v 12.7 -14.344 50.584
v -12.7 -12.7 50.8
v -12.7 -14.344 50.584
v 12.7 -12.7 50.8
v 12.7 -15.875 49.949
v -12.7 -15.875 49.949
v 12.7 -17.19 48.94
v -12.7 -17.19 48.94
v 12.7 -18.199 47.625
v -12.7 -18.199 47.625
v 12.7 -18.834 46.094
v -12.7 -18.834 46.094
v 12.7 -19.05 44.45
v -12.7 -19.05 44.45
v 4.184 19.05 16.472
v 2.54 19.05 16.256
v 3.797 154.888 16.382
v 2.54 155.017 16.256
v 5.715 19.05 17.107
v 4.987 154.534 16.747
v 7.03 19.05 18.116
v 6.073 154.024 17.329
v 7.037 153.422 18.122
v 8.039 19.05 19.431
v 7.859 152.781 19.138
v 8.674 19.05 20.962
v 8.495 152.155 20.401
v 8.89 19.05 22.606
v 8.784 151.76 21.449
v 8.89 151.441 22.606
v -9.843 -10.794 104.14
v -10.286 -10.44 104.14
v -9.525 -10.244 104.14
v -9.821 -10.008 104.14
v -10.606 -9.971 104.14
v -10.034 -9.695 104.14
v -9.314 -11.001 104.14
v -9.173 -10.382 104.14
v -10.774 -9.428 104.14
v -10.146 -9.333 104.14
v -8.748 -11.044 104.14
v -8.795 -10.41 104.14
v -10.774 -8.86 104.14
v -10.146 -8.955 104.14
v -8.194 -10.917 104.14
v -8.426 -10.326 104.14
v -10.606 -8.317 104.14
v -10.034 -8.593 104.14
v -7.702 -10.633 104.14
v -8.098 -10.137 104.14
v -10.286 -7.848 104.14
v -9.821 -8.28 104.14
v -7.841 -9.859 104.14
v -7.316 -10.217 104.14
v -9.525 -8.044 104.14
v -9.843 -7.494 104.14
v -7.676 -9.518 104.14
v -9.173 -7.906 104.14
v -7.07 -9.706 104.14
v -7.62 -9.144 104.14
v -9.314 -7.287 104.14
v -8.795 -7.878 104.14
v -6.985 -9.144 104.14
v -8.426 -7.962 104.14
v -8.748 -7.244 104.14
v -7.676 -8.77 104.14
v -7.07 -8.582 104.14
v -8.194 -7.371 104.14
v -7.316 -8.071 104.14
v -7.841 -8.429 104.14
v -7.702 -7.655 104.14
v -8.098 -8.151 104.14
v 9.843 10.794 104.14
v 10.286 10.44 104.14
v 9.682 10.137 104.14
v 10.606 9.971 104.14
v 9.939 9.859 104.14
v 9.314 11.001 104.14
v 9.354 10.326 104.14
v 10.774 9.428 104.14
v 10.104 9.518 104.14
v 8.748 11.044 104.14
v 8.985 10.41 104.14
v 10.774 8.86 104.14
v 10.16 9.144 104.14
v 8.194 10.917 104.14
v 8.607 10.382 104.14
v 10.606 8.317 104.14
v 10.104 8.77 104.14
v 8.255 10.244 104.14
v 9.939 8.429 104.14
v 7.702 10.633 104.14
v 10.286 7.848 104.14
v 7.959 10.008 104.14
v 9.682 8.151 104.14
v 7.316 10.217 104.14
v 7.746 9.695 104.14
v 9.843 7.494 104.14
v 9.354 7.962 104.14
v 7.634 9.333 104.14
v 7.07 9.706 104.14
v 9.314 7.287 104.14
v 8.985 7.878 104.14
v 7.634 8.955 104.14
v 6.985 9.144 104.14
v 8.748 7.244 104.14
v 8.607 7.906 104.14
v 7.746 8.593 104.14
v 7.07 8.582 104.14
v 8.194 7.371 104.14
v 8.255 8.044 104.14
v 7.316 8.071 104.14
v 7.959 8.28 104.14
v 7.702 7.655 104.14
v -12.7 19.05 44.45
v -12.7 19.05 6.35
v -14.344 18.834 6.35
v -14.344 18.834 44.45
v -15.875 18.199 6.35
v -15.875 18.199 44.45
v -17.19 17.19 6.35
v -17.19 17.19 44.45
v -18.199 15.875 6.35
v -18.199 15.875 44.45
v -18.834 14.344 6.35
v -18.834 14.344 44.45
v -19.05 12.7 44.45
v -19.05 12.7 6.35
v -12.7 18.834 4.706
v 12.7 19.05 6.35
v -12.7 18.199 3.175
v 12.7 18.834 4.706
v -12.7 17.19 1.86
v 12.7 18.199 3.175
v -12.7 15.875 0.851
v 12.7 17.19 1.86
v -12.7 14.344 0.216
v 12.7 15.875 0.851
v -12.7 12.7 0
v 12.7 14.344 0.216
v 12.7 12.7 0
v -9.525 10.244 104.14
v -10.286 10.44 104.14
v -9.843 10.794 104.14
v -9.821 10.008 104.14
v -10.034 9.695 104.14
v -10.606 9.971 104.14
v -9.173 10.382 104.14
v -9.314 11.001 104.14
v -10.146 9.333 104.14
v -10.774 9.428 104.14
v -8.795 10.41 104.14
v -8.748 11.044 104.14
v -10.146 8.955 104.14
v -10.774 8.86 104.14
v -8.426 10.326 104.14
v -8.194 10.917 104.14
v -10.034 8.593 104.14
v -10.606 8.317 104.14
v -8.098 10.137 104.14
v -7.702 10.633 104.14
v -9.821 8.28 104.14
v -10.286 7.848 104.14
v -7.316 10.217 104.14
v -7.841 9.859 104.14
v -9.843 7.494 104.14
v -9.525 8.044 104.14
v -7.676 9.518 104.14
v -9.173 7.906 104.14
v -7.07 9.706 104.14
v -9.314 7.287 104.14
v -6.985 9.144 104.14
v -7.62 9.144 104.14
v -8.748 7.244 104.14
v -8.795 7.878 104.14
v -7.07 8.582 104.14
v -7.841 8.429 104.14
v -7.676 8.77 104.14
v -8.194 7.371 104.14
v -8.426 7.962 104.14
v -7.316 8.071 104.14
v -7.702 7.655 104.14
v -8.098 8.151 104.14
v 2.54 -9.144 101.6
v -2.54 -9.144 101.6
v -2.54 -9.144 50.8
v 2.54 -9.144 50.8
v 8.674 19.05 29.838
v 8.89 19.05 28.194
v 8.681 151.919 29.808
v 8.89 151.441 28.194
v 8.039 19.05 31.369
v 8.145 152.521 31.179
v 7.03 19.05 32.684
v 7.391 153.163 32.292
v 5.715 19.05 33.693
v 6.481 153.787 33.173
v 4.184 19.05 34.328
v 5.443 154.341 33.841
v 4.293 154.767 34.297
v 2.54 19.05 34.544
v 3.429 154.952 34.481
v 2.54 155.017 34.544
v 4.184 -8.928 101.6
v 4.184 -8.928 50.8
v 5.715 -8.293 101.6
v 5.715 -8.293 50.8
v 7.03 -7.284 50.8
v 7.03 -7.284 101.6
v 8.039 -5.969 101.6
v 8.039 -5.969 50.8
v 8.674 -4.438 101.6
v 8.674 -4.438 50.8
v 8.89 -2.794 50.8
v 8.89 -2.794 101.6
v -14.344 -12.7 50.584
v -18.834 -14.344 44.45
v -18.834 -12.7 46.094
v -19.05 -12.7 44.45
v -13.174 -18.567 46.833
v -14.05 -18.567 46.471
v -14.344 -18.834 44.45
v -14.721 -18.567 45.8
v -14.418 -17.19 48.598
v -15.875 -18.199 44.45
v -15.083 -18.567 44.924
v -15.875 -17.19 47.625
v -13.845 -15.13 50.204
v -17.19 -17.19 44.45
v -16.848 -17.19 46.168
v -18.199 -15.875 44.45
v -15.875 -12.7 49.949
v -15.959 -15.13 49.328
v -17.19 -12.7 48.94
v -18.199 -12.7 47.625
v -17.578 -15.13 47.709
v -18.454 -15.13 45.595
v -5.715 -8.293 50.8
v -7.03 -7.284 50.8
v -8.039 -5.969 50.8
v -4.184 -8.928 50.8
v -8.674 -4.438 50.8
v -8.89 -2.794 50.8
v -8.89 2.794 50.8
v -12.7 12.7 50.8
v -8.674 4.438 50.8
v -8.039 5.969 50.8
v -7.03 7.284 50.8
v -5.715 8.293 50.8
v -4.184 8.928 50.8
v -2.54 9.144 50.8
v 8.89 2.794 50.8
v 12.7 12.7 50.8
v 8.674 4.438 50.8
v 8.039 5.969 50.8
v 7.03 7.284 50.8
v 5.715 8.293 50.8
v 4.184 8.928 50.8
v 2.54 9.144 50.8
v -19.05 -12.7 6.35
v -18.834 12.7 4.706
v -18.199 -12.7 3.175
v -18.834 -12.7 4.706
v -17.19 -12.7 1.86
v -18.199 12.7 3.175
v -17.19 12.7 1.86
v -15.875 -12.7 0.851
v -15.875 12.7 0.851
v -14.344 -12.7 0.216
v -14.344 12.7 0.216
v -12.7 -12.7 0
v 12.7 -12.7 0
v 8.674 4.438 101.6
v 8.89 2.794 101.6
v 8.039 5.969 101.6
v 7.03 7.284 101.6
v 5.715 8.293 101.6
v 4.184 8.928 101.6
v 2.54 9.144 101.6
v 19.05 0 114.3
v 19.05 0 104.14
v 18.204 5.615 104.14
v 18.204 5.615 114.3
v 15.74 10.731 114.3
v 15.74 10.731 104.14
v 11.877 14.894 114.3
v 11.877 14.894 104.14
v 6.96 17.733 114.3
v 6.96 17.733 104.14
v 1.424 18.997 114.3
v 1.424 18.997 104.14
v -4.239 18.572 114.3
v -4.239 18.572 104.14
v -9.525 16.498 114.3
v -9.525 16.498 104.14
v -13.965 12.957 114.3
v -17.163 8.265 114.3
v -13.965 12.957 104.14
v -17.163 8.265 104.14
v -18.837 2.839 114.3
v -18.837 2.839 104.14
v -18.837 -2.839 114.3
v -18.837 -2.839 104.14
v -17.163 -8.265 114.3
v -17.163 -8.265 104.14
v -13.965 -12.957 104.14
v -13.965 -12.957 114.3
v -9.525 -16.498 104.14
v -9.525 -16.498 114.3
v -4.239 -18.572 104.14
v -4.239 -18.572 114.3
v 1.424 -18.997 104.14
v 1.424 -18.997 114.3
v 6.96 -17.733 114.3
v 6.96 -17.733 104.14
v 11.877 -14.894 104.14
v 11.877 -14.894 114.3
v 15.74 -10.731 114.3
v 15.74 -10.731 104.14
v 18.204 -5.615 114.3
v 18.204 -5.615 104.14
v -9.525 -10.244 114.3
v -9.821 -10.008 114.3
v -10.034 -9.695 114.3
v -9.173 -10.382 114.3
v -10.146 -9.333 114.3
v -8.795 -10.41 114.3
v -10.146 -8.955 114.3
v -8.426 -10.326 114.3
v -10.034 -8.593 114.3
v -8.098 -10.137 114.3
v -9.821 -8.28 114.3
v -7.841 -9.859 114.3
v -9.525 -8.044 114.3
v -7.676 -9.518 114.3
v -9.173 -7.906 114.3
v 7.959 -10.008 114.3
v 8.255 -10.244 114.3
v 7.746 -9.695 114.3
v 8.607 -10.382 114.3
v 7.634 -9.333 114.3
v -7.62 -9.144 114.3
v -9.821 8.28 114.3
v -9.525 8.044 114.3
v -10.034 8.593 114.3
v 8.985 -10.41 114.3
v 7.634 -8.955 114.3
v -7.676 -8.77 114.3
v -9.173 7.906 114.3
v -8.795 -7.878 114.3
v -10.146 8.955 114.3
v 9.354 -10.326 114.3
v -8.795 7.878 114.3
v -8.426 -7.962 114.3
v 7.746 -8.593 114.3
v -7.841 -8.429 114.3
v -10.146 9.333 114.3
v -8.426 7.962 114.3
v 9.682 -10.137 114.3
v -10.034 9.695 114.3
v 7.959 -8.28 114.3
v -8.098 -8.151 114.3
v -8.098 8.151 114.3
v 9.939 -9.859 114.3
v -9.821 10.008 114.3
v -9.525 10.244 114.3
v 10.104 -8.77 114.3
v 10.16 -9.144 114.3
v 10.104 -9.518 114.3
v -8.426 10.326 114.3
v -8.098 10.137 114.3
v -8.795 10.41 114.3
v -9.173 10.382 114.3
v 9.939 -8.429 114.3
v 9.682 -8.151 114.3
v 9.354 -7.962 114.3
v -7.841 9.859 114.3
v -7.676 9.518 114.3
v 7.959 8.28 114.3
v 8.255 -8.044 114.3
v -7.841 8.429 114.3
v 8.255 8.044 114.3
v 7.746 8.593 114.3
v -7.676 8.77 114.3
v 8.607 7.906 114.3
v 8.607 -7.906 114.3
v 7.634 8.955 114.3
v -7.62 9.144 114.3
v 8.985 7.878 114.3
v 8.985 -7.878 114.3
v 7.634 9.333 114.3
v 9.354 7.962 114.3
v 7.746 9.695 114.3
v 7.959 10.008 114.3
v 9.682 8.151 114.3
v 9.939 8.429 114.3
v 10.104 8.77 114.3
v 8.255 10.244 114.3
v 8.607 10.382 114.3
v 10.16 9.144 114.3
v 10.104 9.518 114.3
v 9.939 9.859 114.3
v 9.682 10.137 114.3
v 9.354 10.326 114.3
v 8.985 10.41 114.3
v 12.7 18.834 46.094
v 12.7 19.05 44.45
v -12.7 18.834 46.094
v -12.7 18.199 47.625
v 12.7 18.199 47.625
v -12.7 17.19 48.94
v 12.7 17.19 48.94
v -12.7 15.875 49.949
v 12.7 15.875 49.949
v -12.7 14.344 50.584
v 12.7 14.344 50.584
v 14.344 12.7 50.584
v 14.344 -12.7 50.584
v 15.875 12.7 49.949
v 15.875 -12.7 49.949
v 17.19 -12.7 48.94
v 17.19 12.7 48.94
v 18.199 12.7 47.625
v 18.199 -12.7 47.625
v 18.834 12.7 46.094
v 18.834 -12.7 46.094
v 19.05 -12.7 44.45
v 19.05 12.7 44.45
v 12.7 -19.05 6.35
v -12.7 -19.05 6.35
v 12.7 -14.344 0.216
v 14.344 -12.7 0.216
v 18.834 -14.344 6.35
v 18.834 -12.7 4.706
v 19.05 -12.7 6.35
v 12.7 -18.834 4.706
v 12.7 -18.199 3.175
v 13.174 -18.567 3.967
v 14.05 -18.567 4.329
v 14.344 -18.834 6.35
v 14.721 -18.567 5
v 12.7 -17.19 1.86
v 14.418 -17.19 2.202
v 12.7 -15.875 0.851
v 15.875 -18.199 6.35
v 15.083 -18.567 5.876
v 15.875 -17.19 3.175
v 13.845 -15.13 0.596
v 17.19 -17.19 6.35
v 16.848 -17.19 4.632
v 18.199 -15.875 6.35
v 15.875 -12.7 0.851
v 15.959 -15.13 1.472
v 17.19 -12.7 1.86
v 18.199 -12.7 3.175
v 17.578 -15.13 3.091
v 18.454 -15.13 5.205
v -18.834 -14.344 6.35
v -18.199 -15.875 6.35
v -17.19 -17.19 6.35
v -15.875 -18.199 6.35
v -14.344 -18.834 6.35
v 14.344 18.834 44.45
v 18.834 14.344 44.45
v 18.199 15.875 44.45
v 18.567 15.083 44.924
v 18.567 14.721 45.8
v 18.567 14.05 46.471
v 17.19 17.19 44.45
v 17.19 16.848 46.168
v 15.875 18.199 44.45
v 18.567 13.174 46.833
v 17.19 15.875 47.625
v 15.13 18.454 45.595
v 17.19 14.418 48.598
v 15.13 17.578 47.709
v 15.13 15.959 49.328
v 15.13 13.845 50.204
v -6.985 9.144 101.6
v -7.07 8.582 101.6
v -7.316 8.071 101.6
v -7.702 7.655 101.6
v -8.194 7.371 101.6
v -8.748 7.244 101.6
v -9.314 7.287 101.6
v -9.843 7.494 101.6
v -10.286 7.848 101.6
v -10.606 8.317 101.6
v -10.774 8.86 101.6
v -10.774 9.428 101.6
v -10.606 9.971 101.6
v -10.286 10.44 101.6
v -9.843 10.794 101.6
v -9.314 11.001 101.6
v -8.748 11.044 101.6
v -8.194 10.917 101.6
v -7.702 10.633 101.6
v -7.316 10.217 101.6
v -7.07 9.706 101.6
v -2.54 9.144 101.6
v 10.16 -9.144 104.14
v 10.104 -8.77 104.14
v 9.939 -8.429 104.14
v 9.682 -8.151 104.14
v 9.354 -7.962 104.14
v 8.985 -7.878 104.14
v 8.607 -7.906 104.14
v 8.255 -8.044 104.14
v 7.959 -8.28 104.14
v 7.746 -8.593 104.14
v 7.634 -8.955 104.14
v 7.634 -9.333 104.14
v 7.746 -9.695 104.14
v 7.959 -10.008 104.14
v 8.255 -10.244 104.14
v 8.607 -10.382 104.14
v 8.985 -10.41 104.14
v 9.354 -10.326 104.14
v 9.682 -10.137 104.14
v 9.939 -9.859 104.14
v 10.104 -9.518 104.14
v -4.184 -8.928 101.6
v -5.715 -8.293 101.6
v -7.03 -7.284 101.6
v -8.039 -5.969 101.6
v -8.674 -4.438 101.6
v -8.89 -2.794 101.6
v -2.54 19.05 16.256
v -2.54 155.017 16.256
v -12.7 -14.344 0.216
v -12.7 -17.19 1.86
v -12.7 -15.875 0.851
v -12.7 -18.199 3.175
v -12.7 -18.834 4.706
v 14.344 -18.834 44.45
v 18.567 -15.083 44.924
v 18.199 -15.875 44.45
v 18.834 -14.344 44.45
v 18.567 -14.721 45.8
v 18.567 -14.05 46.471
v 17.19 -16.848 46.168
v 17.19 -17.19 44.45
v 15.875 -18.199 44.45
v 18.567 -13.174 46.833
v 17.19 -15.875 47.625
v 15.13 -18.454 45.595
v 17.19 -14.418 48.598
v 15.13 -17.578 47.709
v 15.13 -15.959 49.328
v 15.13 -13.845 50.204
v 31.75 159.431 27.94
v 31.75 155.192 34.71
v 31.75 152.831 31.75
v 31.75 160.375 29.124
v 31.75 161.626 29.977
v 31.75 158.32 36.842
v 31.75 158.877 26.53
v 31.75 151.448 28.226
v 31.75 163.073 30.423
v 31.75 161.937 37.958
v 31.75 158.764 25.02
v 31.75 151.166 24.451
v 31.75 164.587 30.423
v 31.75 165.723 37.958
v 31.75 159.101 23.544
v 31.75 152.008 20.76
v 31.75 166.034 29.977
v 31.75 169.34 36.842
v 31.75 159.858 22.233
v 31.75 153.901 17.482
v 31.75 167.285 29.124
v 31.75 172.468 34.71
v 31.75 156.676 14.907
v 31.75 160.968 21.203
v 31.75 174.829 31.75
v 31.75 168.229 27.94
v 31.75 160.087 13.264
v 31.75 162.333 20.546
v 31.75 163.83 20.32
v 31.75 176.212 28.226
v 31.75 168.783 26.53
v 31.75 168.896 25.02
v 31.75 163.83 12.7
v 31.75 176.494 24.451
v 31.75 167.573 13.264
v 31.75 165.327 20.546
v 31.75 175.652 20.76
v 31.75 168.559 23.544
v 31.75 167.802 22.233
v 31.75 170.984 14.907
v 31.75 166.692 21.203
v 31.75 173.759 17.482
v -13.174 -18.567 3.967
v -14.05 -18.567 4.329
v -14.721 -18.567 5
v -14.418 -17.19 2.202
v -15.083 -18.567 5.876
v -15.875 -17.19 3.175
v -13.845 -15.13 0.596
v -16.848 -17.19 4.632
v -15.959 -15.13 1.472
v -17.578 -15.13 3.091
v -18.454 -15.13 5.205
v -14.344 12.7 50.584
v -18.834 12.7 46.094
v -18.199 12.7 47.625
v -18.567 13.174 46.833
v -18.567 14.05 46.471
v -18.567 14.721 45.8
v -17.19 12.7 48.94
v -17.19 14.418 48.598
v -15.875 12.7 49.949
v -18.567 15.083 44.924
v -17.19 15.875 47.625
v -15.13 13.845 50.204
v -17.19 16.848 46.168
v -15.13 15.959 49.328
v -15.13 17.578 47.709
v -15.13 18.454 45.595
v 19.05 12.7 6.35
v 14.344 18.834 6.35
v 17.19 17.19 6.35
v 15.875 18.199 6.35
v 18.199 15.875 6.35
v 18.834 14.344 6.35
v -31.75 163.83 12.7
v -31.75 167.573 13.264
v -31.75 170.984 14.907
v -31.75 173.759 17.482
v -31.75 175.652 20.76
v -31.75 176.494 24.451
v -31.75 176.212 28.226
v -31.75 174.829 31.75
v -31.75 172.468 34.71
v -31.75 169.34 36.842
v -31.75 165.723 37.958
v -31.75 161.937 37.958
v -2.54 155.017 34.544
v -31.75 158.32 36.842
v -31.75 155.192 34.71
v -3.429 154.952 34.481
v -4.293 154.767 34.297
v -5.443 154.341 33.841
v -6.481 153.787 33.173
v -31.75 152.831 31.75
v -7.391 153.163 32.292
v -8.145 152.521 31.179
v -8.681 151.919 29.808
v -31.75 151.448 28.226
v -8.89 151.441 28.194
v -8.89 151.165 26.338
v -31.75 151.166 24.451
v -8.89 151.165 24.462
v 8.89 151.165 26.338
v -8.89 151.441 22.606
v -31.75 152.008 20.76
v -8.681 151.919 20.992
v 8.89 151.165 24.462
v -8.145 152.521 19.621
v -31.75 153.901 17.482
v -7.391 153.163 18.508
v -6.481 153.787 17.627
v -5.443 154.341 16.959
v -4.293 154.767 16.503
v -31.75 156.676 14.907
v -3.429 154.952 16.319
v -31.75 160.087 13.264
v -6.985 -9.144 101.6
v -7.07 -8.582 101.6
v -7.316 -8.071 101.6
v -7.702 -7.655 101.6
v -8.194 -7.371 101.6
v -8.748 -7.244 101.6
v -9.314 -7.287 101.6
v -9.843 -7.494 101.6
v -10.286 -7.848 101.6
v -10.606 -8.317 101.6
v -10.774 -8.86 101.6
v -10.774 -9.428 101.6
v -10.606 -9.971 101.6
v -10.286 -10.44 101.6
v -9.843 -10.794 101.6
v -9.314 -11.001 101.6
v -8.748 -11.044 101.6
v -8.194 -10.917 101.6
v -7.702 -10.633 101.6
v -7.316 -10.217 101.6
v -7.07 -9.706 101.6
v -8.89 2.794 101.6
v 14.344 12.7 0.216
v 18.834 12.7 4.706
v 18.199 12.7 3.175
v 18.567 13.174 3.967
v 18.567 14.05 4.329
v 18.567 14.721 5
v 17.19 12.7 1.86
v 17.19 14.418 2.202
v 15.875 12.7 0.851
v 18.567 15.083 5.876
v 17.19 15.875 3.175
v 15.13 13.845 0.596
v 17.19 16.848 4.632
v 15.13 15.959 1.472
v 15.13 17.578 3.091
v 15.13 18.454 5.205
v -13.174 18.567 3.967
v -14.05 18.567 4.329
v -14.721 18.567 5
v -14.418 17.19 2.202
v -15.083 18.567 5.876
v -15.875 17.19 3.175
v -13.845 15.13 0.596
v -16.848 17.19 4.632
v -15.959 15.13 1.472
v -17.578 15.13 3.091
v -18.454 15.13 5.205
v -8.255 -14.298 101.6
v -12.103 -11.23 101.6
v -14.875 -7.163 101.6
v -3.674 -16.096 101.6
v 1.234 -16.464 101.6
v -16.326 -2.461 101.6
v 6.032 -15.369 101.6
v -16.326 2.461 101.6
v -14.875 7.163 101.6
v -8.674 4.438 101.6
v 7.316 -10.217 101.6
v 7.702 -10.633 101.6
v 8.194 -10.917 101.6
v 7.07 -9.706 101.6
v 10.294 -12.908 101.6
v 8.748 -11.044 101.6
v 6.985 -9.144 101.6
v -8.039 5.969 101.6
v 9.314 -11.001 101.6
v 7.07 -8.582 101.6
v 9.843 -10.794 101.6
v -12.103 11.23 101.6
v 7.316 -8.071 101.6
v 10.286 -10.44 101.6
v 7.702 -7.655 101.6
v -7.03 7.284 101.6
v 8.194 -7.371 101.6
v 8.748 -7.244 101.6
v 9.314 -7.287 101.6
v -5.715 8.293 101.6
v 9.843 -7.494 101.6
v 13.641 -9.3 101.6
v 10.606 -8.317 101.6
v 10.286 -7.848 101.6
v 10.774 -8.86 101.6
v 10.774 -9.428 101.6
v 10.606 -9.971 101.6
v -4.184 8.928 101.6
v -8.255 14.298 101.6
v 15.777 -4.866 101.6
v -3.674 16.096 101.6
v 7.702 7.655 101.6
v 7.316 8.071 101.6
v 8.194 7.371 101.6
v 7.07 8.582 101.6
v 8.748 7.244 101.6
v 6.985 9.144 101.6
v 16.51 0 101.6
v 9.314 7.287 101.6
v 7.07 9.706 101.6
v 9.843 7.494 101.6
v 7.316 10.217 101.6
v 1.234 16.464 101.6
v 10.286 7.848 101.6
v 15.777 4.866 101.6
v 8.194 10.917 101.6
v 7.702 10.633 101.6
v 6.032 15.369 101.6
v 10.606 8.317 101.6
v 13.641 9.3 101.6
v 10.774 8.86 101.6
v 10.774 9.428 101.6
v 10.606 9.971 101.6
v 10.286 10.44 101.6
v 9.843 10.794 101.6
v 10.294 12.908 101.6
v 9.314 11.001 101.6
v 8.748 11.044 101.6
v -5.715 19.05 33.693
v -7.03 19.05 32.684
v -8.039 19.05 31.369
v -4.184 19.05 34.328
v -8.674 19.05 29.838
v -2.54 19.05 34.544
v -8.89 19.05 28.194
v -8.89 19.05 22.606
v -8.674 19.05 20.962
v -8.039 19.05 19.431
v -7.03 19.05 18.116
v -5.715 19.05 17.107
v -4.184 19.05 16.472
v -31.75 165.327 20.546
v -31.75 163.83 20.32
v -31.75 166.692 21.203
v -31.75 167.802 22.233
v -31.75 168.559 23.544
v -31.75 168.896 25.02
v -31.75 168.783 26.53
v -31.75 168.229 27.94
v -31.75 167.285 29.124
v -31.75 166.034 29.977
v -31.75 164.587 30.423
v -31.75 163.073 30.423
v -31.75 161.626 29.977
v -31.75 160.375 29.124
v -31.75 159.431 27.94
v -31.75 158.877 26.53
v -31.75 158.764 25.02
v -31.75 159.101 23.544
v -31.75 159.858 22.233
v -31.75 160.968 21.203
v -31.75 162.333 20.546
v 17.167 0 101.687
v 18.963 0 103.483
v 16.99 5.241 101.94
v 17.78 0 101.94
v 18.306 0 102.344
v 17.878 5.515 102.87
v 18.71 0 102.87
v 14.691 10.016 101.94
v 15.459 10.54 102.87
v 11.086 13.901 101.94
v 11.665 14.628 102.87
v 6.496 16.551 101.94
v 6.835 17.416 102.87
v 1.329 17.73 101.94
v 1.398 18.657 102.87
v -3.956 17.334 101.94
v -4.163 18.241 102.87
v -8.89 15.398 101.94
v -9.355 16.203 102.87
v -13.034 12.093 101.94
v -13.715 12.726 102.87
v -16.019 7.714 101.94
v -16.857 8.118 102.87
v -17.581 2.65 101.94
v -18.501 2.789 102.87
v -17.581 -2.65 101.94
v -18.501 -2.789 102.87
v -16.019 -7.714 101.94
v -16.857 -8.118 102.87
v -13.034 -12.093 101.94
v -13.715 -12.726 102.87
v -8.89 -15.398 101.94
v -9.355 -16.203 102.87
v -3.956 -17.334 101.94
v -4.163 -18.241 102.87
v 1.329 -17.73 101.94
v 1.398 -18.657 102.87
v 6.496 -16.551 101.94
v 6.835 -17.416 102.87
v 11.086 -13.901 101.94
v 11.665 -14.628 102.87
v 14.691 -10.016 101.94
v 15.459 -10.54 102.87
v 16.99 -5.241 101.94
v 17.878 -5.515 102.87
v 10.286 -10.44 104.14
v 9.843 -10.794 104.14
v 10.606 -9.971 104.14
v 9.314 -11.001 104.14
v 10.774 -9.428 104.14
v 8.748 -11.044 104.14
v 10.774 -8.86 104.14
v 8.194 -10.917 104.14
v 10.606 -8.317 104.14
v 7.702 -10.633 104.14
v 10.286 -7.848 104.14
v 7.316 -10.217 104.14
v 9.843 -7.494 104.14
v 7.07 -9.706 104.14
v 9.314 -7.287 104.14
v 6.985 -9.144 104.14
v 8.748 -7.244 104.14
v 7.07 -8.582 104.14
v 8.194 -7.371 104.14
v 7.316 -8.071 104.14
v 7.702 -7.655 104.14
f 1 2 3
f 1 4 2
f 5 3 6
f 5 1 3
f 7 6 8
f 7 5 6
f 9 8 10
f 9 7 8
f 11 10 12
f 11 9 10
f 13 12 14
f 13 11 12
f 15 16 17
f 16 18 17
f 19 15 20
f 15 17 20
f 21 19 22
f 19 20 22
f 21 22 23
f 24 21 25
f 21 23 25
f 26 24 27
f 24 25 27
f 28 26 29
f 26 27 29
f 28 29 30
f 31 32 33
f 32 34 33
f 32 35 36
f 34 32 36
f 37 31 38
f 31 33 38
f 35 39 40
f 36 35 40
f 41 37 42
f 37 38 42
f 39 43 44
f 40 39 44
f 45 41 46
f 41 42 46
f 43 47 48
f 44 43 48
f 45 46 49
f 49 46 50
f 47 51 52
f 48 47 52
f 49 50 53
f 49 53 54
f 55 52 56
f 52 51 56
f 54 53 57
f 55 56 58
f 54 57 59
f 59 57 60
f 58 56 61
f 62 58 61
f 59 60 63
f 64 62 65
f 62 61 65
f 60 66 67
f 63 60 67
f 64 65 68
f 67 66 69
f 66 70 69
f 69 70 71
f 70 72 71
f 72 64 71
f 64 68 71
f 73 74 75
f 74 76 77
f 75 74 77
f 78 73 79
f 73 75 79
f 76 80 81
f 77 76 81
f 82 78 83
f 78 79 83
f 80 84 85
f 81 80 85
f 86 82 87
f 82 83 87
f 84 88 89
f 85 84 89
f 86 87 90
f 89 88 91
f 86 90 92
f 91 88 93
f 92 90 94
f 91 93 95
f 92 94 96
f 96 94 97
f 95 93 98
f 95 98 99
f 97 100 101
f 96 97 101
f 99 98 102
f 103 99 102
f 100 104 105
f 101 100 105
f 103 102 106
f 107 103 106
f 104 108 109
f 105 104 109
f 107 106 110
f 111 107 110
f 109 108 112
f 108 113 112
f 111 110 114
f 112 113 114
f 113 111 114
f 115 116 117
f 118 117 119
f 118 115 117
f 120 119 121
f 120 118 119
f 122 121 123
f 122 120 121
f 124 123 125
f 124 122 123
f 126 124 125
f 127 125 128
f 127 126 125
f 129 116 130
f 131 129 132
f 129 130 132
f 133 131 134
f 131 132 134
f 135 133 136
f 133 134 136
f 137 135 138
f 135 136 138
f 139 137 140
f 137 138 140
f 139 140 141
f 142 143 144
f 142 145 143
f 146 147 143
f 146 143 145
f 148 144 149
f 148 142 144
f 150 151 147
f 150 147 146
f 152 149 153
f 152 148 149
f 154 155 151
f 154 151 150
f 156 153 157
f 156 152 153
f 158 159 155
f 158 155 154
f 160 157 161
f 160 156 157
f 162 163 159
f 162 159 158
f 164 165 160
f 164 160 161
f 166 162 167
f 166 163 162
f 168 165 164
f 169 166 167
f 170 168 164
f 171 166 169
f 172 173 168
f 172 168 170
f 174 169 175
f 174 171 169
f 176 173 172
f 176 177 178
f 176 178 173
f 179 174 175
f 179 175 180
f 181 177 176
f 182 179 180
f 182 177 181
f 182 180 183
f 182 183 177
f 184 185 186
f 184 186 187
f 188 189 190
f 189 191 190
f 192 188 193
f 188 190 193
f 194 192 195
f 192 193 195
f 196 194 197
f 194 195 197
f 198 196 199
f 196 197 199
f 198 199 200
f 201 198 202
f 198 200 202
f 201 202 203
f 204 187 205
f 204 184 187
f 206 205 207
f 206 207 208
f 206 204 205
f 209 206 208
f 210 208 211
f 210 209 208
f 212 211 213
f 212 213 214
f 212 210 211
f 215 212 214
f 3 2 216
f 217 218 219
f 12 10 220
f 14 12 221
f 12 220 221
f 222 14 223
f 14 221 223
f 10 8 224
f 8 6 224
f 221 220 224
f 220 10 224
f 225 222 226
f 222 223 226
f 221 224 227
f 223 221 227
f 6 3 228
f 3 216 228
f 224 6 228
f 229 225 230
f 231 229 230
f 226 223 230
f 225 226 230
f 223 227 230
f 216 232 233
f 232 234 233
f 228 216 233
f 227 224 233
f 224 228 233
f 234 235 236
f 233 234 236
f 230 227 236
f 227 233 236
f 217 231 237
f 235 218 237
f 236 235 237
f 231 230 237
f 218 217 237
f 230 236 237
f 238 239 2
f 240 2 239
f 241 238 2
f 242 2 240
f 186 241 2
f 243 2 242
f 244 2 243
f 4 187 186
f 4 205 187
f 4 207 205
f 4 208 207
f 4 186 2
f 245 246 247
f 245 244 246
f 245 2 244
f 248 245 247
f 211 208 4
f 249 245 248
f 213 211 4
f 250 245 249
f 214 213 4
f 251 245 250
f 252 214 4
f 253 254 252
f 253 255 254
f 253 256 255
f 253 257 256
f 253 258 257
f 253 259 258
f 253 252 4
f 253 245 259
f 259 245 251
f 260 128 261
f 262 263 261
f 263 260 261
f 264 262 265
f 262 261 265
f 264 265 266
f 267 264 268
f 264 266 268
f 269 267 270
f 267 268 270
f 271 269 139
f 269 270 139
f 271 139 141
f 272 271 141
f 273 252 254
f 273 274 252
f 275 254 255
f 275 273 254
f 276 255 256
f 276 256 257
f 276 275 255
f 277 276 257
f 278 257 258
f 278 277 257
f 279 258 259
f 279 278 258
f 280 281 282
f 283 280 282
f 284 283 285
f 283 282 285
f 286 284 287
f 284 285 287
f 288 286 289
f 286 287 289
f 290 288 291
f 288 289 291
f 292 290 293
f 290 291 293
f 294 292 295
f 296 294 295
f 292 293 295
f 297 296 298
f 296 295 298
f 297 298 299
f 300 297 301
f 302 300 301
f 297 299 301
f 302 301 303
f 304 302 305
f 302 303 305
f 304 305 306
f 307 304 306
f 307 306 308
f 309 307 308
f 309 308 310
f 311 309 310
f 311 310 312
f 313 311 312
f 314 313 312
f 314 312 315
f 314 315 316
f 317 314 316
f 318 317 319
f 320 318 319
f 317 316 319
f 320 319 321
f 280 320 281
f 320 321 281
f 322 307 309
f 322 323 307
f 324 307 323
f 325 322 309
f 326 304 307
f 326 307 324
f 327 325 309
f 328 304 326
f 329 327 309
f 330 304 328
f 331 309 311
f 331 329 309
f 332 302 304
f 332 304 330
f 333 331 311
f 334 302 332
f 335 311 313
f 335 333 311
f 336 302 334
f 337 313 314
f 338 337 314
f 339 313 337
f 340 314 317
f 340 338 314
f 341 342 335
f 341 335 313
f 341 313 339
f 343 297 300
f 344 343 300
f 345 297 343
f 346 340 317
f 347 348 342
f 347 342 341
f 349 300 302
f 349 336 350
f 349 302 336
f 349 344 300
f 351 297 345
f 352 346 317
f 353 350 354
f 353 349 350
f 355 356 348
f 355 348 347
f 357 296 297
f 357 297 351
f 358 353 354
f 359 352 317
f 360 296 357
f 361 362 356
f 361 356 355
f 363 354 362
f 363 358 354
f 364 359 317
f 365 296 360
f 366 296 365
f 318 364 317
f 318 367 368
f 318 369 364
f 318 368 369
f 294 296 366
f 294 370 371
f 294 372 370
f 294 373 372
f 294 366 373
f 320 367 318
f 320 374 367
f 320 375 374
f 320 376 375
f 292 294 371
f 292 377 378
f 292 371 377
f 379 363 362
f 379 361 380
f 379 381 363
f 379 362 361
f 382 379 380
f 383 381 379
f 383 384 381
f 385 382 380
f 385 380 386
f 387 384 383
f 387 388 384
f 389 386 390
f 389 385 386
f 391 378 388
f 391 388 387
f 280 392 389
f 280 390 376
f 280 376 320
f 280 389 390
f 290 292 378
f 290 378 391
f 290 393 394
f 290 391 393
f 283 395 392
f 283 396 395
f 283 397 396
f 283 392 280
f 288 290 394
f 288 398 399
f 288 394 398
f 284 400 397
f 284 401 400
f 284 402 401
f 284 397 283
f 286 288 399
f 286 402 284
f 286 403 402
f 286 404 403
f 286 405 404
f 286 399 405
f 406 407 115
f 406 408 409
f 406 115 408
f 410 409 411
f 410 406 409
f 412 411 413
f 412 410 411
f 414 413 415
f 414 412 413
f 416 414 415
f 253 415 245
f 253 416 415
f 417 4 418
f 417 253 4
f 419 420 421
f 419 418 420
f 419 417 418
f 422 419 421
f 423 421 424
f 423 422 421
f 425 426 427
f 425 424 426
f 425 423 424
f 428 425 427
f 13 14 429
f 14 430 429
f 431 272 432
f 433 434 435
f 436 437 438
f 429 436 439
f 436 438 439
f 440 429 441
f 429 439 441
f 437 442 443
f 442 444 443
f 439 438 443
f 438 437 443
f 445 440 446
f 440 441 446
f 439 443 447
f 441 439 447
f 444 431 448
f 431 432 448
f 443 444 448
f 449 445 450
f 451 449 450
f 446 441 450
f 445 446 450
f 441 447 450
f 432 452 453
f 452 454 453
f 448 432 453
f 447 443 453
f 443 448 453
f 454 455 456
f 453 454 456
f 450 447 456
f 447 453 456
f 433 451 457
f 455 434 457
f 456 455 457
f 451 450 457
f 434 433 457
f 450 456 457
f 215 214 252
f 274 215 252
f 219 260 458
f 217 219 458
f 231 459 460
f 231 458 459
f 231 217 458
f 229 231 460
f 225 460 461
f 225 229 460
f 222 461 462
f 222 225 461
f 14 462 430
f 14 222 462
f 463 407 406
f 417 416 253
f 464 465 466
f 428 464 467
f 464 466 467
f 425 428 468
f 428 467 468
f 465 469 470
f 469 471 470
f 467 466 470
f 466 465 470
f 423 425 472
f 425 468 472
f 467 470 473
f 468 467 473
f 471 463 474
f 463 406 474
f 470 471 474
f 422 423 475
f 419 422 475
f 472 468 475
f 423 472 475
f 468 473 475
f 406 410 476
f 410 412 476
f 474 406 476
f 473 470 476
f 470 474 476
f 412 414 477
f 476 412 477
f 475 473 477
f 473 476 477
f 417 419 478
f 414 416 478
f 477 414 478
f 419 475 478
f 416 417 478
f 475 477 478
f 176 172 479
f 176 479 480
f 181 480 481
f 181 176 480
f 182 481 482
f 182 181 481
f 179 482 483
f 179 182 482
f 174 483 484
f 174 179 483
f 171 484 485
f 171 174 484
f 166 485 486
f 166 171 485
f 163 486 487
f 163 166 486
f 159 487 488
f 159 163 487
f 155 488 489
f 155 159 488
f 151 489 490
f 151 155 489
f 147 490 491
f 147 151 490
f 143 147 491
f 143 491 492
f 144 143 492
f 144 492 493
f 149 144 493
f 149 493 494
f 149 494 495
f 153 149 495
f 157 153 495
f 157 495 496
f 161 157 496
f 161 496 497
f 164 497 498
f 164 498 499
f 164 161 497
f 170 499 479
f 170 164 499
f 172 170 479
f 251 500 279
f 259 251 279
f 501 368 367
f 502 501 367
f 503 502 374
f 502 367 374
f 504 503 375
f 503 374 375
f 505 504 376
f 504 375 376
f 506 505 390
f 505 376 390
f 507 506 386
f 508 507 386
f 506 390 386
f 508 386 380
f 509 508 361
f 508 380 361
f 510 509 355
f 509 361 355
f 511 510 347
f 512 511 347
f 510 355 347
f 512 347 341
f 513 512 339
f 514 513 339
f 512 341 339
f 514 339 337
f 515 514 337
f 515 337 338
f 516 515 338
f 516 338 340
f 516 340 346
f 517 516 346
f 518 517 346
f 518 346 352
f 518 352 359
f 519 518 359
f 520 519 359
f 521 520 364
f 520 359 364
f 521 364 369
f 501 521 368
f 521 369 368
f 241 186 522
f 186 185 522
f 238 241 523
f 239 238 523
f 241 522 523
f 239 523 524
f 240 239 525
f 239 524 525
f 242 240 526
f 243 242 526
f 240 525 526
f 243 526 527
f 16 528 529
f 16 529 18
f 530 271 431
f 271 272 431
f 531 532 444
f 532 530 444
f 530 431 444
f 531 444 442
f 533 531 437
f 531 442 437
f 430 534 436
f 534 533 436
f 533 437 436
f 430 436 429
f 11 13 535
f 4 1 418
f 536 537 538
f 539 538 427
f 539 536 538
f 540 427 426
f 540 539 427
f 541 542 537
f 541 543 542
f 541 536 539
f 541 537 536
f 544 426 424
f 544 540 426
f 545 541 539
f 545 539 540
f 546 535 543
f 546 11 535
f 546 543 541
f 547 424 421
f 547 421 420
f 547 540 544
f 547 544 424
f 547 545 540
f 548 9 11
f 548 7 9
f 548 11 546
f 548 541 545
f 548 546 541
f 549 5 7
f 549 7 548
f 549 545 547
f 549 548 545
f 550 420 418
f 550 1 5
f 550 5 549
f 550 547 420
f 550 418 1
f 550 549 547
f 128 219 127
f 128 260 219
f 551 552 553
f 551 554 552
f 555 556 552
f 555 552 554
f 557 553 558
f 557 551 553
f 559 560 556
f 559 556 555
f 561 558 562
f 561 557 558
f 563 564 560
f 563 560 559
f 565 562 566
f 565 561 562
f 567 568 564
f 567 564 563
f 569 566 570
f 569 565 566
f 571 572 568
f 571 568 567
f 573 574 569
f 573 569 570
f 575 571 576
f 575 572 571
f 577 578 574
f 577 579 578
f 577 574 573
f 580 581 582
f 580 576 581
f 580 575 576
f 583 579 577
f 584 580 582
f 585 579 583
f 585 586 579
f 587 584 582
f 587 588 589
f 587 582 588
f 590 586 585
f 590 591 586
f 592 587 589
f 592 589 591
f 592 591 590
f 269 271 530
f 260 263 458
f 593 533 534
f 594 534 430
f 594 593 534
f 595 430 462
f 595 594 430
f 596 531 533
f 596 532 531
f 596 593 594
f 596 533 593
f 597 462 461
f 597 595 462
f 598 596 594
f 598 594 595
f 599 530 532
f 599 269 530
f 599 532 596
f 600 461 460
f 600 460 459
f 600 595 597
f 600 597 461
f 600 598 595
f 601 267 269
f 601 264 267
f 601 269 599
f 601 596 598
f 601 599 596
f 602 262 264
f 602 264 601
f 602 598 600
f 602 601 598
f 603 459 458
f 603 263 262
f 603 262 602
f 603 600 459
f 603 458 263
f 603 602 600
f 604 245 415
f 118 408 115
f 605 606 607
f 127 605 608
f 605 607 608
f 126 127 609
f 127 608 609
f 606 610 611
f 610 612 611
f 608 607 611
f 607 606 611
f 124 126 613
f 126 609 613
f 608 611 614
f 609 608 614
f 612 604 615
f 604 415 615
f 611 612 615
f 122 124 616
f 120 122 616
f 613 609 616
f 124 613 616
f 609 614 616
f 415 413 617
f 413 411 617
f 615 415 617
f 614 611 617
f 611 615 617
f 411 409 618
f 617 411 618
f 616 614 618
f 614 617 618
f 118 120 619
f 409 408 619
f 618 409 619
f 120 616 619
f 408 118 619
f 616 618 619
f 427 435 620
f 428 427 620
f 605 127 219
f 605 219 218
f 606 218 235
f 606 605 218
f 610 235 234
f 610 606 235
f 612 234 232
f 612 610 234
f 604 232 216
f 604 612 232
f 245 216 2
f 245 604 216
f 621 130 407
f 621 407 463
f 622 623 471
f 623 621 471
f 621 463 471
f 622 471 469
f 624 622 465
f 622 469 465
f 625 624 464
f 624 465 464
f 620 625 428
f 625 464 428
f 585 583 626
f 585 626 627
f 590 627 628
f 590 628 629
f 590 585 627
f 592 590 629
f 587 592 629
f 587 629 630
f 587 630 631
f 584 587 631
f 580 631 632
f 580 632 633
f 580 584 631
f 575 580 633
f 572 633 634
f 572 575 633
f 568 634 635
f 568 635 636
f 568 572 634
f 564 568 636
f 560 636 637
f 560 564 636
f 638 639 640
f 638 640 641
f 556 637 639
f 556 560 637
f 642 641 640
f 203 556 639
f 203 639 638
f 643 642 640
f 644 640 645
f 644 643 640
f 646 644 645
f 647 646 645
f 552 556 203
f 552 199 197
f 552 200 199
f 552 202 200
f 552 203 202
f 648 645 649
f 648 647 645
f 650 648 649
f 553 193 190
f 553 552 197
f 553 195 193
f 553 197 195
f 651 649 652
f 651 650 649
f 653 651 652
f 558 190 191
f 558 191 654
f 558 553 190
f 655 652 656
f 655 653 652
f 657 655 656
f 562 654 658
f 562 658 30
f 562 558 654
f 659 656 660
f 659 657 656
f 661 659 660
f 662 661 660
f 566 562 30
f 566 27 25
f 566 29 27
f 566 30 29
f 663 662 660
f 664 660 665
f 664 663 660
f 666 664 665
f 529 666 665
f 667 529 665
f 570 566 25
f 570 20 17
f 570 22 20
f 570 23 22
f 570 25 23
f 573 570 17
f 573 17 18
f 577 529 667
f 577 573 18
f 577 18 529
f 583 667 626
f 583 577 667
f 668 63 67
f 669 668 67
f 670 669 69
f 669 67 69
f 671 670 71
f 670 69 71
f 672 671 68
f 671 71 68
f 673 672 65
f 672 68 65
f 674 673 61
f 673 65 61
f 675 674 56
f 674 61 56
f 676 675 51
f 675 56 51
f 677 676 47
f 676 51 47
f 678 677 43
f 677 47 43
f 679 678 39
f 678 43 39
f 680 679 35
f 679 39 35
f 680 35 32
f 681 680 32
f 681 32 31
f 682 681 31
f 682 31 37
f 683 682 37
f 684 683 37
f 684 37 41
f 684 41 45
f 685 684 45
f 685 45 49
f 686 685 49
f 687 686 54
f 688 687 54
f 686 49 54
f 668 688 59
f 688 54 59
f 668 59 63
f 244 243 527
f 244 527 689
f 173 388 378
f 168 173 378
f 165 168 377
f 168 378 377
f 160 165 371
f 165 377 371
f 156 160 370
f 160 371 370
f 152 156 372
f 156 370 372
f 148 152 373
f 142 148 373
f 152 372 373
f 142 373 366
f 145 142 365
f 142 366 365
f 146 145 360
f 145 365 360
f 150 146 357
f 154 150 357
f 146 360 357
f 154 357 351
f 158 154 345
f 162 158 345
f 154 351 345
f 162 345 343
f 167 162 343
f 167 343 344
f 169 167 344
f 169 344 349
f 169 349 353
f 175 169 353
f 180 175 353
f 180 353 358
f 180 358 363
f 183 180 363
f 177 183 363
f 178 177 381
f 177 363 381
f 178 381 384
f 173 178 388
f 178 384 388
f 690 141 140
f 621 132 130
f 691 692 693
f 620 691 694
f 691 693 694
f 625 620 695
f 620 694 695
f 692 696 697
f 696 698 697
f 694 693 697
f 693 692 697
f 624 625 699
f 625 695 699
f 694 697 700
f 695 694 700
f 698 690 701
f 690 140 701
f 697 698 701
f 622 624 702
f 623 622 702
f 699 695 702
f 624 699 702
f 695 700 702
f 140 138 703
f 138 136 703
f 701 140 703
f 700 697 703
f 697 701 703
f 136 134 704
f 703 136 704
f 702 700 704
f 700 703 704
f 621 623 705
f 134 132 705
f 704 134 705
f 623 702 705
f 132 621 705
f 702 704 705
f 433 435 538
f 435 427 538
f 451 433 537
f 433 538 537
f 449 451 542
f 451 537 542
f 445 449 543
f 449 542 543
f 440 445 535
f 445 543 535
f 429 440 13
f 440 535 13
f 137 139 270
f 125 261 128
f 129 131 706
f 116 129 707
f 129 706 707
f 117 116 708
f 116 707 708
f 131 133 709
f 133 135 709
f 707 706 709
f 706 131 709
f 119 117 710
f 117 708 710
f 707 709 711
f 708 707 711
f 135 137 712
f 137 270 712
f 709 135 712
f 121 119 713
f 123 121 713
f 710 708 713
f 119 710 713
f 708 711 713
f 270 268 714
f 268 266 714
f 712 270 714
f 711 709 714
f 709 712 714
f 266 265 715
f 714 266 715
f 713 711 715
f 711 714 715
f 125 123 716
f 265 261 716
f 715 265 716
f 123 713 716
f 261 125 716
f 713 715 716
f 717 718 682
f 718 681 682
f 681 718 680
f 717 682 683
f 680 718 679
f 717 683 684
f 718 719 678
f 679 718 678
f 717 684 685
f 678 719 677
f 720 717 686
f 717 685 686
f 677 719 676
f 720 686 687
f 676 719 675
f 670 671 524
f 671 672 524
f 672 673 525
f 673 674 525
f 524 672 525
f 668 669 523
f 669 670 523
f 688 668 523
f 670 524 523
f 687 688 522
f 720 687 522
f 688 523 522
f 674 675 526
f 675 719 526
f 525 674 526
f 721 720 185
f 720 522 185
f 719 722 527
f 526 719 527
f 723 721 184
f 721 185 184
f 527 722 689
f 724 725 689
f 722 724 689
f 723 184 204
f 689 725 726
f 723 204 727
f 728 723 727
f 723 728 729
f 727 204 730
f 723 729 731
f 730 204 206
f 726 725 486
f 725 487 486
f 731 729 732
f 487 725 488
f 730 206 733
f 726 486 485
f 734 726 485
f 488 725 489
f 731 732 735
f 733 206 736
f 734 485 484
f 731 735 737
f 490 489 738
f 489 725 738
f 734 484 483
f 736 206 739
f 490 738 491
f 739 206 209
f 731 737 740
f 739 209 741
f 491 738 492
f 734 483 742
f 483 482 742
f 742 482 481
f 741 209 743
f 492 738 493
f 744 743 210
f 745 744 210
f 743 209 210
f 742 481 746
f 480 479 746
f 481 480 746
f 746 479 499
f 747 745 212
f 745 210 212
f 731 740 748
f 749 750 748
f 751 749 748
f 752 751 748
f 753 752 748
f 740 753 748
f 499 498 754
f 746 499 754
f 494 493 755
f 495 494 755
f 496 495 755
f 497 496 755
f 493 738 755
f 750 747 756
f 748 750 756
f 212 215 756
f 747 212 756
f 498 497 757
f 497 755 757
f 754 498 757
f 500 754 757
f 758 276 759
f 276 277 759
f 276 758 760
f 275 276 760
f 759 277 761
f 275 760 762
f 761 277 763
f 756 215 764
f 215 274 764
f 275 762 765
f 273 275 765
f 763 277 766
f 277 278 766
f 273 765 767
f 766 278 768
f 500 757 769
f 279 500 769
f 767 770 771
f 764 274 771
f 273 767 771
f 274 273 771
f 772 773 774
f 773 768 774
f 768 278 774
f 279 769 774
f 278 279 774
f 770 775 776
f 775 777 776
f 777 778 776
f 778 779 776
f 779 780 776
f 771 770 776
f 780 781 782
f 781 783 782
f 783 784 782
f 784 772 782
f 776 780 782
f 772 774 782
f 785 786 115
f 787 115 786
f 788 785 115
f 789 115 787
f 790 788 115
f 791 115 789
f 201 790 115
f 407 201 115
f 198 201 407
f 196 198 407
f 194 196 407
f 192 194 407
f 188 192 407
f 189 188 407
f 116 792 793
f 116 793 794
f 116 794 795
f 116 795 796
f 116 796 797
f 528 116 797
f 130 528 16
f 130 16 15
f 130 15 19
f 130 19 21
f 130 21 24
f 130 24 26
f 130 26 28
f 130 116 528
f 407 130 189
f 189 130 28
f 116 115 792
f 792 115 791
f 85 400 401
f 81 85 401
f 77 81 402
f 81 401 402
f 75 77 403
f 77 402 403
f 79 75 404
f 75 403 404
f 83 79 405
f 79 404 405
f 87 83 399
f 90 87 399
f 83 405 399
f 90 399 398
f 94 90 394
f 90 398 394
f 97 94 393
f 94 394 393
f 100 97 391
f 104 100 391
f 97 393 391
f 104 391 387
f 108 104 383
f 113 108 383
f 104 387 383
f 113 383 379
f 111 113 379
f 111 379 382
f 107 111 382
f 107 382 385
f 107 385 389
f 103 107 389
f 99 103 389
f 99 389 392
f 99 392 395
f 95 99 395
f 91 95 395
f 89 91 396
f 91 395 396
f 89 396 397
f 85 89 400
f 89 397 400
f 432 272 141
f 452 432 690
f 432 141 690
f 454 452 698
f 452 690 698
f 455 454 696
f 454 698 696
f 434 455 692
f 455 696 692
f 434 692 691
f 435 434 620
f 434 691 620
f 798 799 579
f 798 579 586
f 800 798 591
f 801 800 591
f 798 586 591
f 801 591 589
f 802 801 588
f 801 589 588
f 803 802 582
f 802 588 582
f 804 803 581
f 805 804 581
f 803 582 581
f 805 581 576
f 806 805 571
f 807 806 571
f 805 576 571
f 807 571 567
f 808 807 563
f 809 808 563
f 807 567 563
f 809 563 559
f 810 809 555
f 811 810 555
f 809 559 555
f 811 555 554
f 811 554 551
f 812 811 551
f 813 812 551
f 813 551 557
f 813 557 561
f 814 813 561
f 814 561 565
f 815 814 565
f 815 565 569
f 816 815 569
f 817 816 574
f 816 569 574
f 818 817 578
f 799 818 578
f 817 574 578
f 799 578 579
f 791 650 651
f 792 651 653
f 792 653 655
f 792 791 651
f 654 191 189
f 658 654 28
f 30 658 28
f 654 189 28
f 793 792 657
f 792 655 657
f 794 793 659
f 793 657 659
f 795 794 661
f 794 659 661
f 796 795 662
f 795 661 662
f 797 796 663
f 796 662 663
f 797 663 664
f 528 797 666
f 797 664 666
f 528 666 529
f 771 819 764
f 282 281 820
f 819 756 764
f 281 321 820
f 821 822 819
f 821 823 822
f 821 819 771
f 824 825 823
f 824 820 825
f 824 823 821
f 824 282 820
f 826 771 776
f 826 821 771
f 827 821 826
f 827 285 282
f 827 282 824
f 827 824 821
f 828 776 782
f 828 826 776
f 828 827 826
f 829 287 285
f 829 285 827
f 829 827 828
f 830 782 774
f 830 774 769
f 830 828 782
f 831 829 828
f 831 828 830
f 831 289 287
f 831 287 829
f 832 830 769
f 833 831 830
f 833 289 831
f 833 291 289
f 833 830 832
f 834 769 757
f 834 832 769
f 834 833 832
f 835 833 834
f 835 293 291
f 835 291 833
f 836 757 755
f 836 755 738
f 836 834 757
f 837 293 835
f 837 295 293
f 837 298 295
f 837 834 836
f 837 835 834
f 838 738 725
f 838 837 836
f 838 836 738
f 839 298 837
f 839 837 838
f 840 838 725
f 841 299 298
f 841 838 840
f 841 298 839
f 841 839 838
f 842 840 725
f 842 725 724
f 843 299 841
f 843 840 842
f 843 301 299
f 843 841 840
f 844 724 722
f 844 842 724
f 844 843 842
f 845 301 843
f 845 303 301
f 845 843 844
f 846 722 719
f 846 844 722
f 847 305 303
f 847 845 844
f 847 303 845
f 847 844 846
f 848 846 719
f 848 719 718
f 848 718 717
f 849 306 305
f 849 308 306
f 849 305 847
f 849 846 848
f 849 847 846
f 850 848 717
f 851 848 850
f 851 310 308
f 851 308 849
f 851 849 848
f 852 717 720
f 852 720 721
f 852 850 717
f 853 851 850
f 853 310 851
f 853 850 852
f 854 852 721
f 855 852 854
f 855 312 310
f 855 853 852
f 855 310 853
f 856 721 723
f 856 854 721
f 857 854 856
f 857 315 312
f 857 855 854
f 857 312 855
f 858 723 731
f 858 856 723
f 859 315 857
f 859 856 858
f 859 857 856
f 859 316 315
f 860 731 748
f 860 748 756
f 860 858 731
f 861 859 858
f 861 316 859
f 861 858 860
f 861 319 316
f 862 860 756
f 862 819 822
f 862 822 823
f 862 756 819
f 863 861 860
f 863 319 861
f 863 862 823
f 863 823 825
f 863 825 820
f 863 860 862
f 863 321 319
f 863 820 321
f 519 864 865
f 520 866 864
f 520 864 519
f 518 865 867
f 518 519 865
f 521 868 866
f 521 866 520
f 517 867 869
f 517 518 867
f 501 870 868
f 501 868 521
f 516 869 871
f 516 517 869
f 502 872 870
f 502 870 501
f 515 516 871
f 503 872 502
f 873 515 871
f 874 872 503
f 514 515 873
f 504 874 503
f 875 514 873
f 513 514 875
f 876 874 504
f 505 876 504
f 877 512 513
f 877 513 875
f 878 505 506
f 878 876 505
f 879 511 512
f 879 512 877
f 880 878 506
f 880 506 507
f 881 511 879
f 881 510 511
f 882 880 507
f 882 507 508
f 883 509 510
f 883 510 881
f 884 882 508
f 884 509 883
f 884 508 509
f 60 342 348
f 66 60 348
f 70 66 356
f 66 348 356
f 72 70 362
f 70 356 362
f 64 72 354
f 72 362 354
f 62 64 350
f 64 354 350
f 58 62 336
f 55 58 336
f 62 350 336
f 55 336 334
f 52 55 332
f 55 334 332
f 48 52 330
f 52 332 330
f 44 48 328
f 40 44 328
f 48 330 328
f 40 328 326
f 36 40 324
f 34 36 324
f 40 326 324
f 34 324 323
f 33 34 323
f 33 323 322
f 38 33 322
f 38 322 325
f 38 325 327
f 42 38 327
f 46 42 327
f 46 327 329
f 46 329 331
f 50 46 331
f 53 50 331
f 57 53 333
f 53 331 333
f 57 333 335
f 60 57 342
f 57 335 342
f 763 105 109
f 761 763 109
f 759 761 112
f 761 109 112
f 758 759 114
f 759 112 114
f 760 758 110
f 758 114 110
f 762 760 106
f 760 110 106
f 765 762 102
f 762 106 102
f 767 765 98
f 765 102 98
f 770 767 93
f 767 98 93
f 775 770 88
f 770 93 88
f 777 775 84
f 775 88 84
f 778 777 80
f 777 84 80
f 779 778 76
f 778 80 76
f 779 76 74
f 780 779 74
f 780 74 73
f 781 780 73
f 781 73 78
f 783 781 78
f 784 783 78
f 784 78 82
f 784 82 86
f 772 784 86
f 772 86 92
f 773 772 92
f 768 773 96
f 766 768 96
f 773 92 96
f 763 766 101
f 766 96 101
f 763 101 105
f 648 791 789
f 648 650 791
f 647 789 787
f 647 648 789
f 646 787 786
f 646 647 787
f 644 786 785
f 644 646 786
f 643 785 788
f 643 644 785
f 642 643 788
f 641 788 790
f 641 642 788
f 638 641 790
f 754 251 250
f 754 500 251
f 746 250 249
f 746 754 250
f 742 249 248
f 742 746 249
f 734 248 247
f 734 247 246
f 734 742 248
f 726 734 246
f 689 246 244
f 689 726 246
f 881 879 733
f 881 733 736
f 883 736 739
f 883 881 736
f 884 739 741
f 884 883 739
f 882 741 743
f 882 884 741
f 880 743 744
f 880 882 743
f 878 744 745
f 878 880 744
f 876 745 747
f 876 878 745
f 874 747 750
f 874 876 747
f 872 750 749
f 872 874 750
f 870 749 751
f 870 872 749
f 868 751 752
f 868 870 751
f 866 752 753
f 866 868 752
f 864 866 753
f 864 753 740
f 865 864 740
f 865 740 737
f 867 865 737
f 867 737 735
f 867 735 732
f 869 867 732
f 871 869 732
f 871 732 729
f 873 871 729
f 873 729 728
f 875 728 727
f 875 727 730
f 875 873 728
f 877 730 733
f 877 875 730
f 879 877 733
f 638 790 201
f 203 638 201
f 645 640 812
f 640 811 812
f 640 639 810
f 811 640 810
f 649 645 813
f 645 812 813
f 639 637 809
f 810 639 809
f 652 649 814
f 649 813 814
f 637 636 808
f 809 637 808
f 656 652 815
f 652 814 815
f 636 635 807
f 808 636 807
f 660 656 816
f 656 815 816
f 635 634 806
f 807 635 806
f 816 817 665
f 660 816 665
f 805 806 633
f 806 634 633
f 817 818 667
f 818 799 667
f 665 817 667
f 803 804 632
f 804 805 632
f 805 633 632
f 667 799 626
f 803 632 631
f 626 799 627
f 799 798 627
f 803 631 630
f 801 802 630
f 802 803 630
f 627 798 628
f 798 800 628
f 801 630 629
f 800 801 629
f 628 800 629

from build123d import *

# Parameters (mm, degrees)
SKETCH1_W               = 38.1
SKETCH1_H               = 38.1
BOSS_EXTRUDE1_DEPTH     = 50.8
SKETCH2_W               = 17.78
SKETCH2_H               = 18.288
BOSS_EXTRUDE2_DEPTH     = 50.8
SKETCH3_R               = 19.05
BOSS_EXTRUDE3_DEPTH     = 12.7
SKETCH4_W               = 17.78
SKETCH4_H               = 18.288
BOSS_EXTRUDE4_DEPTH     = 137.16
SKETCH6_R               = 12.7
BOSS_EXTRUDE5_DEPTH     = 31.75
SKETCH7_R               = 5.08
CUT_EXTRUDE1_DEPTH      = 63.5
SKETCH8_R               = 1.27
CUT_EXTRUDE2_DEPTH      = 10.16
SKETCH8_3_R             = 1.27
CUT_EXTRUDE3_DEPTH      = 10.16
SKETCH8_4_R             = 1.27
CUT_EXTRUDE4_DEPTH      = 10.16
SKETCH8_5_R             = 1.27
CUT_EXTRUDE5_DEPTH      = 10.16
FILLET1_R               = 6.35
SKETCH10_R              = 1.905
CUT_EXTRUDE6_DEPTH      = 2.54
MIRROR2_COPY_1_SKETCH_R = 1.905
MIRROR2_COPY_1_DEPTH    = 2.54
MIRROR2_COPY_2_SKETCH_R = 1.905
MIRROR2_COPY_2_DEPTH    = 2.54
FILLET2_R               = 2.54


with BuildPart() as part:
    # Sketch1 → Boss-Extrude1 (new body)
    with BuildSketch(Plane.XY):
        Rectangle(SKETCH1_W, SKETCH1_H)
    extrude(amount=BOSS_EXTRUDE1_DEPTH)

    # Sketch2 → Boss-Extrude2 (add)
    with BuildSketch(Plane.XY.offset(50.8)):
        Rectangle(SKETCH2_W, SKETCH2_H)
    extrude(amount=BOSS_EXTRUDE2_DEPTH)

    # Sketch3 → Boss-Extrude3 (add)
    with BuildSketch(Plane.XY.offset(101.6)):
        Circle(SKETCH3_R)
    extrude(amount=BOSS_EXTRUDE3_DEPTH)

    # Sketch4 → Boss-Extrude4 (add)
    with BuildSketch(Plane(origin=(0, 19.05, 0), x_dir=(1, 0, 0), z_dir=(0, 1, 0))):
        with Locations((0, -25.4)):
            Rectangle(SKETCH4_W, SKETCH4_H)
    extrude(amount=BOSS_EXTRUDE4_DEPTH)

    # Sketch6 → Boss-Extrude5 (add, symmetric)
    with BuildSketch(Plane(origin=(0, 0, 0), x_dir=(0, 0, -1), z_dir=(1, 0, 0))):
        with Locations((-25.4, 163.83)):
            Circle(SKETCH6_R)
    extrude(amount=BOSS_EXTRUDE5_DEPTH, both=True)

    # Sketch7 → Cut-Extrude1 (cut)
    with BuildSketch(Plane(origin=(31.75, 0, 0), x_dir=(0, 0, -1), z_dir=(1, 0, 0))):
        with Locations((-25.4, 163.83)):
            Circle(SKETCH7_R)
    extrude(amount=-CUT_EXTRUDE1_DEPTH, mode=Mode.SUBTRACT)

    # Sketch8 → Cut-Extrude2 (cut)
    with BuildSketch(Plane.XY.offset(114.3)):
        with Locations((8.89, 9.144)):
            Circle(SKETCH8_R)
    extrude(amount=-CUT_EXTRUDE2_DEPTH, mode=Mode.SUBTRACT)

    # Sketch8<3> → Cut-Extrude3 (cut)
    with BuildSketch(Plane.XY.offset(114.3)):
        with Locations((8.89, -9.144)):
            Circle(SKETCH8_3_R)
    extrude(amount=-CUT_EXTRUDE3_DEPTH, mode=Mode.SUBTRACT)

    # Sketch8<4> → Cut-Extrude4 (cut)
    with BuildSketch(Plane.XY.offset(114.3)):
        with Locations((-8.89, -9.144)):
            Circle(SKETCH8_4_R)
    extrude(amount=-CUT_EXTRUDE4_DEPTH, mode=Mode.SUBTRACT)

    # Sketch8<5> → Cut-Extrude5 (cut)
    with BuildSketch(Plane.XY.offset(114.3)):
        with Locations((-8.89, 9.144)):
            Circle(SKETCH8_5_R)
    extrude(amount=-CUT_EXTRUDE5_DEPTH, mode=Mode.SUBTRACT)

    # Fillet1
    fillet1_edges = [part.edges().sort_by_distance(p)[0] for p in [
        (-19.05, 19.05, 25.4),
        (-19.05, 0, 50.8),
        (-19.05, -19.05, 25.4),
        (-19.05, 0, 0),
        (8.89, -9.144, 76.2),
        (8.89, 9.144, 76.2),
        (-8.89, -9.144, 76.2),
        (0, 19.05, 50.8),
        (-8.89, 9.144, 76.2),
        (0, -19.05, 0),
        (0, 19.05, 0),
        (19.05, 19.05, 25.4),
        (19.05, 0, 0),
        (19.05, -19.05, 25.4),
        (0, -19.05, 50.8),
        (19.05, 0, 50.8),
        (-8.89, 87.0332647, 34.544),
        (-8.89, 87.0332647, 16.256),
        (8.89, 87.0332647, 16.256),
        (8.89, 87.0332647, 34.544),
    ]]
    fillet(fillet1_edges, radius=FILLET1_R)

    # Sketch10 → Cut-Extrude6 (cut)
    with BuildSketch(Plane.XY.offset(104.14)):
        with Locations((-8.89, -9.144)):
            Circle(SKETCH10_R)
    cut_extrude6 = extrude(amount=-CUT_EXTRUDE6_DEPTH, mode=Mode.SUBTRACT)

    # Mirror1: Cut-Extrude6 across plane
    add(cut_extrude6.mirror(Plane.ZX), mode=Mode.SUBTRACT)

    # Mirror2 copy 1 sketch → Mirror2 copy 1 (cut)
    with BuildSketch(Plane(origin=(0, 0, 104.14), x_dir=(-1, 0, 0), z_dir=(0, 0, 1))):
        with Locations((-8.89, -9.144)):
            Circle(MIRROR2_COPY_1_SKETCH_R)
    extrude(amount=-MIRROR2_COPY_1_DEPTH, mode=Mode.SUBTRACT)

    # Mirror2 copy 2 sketch → Mirror2 copy 2 (cut)
    with BuildSketch(Plane(origin=(0, 0, 104.14), x_dir=(-1, 0, 0), z_dir=(0, 0, 1))):
        with Locations((-8.89, 9.144)):
            Circle(MIRROR2_COPY_2_SKETCH_R)
    extrude(amount=-MIRROR2_COPY_2_DEPTH, mode=Mode.SUBTRACT)

    # Fillet2
    fillet2_edges = [part.edges().sort_by_distance(p)[0] for p in [
        (-19.05, 0, 101.6),
    ]]
    fillet(fillet2_edges, radius=FILLET2_R)


solid = part.part
